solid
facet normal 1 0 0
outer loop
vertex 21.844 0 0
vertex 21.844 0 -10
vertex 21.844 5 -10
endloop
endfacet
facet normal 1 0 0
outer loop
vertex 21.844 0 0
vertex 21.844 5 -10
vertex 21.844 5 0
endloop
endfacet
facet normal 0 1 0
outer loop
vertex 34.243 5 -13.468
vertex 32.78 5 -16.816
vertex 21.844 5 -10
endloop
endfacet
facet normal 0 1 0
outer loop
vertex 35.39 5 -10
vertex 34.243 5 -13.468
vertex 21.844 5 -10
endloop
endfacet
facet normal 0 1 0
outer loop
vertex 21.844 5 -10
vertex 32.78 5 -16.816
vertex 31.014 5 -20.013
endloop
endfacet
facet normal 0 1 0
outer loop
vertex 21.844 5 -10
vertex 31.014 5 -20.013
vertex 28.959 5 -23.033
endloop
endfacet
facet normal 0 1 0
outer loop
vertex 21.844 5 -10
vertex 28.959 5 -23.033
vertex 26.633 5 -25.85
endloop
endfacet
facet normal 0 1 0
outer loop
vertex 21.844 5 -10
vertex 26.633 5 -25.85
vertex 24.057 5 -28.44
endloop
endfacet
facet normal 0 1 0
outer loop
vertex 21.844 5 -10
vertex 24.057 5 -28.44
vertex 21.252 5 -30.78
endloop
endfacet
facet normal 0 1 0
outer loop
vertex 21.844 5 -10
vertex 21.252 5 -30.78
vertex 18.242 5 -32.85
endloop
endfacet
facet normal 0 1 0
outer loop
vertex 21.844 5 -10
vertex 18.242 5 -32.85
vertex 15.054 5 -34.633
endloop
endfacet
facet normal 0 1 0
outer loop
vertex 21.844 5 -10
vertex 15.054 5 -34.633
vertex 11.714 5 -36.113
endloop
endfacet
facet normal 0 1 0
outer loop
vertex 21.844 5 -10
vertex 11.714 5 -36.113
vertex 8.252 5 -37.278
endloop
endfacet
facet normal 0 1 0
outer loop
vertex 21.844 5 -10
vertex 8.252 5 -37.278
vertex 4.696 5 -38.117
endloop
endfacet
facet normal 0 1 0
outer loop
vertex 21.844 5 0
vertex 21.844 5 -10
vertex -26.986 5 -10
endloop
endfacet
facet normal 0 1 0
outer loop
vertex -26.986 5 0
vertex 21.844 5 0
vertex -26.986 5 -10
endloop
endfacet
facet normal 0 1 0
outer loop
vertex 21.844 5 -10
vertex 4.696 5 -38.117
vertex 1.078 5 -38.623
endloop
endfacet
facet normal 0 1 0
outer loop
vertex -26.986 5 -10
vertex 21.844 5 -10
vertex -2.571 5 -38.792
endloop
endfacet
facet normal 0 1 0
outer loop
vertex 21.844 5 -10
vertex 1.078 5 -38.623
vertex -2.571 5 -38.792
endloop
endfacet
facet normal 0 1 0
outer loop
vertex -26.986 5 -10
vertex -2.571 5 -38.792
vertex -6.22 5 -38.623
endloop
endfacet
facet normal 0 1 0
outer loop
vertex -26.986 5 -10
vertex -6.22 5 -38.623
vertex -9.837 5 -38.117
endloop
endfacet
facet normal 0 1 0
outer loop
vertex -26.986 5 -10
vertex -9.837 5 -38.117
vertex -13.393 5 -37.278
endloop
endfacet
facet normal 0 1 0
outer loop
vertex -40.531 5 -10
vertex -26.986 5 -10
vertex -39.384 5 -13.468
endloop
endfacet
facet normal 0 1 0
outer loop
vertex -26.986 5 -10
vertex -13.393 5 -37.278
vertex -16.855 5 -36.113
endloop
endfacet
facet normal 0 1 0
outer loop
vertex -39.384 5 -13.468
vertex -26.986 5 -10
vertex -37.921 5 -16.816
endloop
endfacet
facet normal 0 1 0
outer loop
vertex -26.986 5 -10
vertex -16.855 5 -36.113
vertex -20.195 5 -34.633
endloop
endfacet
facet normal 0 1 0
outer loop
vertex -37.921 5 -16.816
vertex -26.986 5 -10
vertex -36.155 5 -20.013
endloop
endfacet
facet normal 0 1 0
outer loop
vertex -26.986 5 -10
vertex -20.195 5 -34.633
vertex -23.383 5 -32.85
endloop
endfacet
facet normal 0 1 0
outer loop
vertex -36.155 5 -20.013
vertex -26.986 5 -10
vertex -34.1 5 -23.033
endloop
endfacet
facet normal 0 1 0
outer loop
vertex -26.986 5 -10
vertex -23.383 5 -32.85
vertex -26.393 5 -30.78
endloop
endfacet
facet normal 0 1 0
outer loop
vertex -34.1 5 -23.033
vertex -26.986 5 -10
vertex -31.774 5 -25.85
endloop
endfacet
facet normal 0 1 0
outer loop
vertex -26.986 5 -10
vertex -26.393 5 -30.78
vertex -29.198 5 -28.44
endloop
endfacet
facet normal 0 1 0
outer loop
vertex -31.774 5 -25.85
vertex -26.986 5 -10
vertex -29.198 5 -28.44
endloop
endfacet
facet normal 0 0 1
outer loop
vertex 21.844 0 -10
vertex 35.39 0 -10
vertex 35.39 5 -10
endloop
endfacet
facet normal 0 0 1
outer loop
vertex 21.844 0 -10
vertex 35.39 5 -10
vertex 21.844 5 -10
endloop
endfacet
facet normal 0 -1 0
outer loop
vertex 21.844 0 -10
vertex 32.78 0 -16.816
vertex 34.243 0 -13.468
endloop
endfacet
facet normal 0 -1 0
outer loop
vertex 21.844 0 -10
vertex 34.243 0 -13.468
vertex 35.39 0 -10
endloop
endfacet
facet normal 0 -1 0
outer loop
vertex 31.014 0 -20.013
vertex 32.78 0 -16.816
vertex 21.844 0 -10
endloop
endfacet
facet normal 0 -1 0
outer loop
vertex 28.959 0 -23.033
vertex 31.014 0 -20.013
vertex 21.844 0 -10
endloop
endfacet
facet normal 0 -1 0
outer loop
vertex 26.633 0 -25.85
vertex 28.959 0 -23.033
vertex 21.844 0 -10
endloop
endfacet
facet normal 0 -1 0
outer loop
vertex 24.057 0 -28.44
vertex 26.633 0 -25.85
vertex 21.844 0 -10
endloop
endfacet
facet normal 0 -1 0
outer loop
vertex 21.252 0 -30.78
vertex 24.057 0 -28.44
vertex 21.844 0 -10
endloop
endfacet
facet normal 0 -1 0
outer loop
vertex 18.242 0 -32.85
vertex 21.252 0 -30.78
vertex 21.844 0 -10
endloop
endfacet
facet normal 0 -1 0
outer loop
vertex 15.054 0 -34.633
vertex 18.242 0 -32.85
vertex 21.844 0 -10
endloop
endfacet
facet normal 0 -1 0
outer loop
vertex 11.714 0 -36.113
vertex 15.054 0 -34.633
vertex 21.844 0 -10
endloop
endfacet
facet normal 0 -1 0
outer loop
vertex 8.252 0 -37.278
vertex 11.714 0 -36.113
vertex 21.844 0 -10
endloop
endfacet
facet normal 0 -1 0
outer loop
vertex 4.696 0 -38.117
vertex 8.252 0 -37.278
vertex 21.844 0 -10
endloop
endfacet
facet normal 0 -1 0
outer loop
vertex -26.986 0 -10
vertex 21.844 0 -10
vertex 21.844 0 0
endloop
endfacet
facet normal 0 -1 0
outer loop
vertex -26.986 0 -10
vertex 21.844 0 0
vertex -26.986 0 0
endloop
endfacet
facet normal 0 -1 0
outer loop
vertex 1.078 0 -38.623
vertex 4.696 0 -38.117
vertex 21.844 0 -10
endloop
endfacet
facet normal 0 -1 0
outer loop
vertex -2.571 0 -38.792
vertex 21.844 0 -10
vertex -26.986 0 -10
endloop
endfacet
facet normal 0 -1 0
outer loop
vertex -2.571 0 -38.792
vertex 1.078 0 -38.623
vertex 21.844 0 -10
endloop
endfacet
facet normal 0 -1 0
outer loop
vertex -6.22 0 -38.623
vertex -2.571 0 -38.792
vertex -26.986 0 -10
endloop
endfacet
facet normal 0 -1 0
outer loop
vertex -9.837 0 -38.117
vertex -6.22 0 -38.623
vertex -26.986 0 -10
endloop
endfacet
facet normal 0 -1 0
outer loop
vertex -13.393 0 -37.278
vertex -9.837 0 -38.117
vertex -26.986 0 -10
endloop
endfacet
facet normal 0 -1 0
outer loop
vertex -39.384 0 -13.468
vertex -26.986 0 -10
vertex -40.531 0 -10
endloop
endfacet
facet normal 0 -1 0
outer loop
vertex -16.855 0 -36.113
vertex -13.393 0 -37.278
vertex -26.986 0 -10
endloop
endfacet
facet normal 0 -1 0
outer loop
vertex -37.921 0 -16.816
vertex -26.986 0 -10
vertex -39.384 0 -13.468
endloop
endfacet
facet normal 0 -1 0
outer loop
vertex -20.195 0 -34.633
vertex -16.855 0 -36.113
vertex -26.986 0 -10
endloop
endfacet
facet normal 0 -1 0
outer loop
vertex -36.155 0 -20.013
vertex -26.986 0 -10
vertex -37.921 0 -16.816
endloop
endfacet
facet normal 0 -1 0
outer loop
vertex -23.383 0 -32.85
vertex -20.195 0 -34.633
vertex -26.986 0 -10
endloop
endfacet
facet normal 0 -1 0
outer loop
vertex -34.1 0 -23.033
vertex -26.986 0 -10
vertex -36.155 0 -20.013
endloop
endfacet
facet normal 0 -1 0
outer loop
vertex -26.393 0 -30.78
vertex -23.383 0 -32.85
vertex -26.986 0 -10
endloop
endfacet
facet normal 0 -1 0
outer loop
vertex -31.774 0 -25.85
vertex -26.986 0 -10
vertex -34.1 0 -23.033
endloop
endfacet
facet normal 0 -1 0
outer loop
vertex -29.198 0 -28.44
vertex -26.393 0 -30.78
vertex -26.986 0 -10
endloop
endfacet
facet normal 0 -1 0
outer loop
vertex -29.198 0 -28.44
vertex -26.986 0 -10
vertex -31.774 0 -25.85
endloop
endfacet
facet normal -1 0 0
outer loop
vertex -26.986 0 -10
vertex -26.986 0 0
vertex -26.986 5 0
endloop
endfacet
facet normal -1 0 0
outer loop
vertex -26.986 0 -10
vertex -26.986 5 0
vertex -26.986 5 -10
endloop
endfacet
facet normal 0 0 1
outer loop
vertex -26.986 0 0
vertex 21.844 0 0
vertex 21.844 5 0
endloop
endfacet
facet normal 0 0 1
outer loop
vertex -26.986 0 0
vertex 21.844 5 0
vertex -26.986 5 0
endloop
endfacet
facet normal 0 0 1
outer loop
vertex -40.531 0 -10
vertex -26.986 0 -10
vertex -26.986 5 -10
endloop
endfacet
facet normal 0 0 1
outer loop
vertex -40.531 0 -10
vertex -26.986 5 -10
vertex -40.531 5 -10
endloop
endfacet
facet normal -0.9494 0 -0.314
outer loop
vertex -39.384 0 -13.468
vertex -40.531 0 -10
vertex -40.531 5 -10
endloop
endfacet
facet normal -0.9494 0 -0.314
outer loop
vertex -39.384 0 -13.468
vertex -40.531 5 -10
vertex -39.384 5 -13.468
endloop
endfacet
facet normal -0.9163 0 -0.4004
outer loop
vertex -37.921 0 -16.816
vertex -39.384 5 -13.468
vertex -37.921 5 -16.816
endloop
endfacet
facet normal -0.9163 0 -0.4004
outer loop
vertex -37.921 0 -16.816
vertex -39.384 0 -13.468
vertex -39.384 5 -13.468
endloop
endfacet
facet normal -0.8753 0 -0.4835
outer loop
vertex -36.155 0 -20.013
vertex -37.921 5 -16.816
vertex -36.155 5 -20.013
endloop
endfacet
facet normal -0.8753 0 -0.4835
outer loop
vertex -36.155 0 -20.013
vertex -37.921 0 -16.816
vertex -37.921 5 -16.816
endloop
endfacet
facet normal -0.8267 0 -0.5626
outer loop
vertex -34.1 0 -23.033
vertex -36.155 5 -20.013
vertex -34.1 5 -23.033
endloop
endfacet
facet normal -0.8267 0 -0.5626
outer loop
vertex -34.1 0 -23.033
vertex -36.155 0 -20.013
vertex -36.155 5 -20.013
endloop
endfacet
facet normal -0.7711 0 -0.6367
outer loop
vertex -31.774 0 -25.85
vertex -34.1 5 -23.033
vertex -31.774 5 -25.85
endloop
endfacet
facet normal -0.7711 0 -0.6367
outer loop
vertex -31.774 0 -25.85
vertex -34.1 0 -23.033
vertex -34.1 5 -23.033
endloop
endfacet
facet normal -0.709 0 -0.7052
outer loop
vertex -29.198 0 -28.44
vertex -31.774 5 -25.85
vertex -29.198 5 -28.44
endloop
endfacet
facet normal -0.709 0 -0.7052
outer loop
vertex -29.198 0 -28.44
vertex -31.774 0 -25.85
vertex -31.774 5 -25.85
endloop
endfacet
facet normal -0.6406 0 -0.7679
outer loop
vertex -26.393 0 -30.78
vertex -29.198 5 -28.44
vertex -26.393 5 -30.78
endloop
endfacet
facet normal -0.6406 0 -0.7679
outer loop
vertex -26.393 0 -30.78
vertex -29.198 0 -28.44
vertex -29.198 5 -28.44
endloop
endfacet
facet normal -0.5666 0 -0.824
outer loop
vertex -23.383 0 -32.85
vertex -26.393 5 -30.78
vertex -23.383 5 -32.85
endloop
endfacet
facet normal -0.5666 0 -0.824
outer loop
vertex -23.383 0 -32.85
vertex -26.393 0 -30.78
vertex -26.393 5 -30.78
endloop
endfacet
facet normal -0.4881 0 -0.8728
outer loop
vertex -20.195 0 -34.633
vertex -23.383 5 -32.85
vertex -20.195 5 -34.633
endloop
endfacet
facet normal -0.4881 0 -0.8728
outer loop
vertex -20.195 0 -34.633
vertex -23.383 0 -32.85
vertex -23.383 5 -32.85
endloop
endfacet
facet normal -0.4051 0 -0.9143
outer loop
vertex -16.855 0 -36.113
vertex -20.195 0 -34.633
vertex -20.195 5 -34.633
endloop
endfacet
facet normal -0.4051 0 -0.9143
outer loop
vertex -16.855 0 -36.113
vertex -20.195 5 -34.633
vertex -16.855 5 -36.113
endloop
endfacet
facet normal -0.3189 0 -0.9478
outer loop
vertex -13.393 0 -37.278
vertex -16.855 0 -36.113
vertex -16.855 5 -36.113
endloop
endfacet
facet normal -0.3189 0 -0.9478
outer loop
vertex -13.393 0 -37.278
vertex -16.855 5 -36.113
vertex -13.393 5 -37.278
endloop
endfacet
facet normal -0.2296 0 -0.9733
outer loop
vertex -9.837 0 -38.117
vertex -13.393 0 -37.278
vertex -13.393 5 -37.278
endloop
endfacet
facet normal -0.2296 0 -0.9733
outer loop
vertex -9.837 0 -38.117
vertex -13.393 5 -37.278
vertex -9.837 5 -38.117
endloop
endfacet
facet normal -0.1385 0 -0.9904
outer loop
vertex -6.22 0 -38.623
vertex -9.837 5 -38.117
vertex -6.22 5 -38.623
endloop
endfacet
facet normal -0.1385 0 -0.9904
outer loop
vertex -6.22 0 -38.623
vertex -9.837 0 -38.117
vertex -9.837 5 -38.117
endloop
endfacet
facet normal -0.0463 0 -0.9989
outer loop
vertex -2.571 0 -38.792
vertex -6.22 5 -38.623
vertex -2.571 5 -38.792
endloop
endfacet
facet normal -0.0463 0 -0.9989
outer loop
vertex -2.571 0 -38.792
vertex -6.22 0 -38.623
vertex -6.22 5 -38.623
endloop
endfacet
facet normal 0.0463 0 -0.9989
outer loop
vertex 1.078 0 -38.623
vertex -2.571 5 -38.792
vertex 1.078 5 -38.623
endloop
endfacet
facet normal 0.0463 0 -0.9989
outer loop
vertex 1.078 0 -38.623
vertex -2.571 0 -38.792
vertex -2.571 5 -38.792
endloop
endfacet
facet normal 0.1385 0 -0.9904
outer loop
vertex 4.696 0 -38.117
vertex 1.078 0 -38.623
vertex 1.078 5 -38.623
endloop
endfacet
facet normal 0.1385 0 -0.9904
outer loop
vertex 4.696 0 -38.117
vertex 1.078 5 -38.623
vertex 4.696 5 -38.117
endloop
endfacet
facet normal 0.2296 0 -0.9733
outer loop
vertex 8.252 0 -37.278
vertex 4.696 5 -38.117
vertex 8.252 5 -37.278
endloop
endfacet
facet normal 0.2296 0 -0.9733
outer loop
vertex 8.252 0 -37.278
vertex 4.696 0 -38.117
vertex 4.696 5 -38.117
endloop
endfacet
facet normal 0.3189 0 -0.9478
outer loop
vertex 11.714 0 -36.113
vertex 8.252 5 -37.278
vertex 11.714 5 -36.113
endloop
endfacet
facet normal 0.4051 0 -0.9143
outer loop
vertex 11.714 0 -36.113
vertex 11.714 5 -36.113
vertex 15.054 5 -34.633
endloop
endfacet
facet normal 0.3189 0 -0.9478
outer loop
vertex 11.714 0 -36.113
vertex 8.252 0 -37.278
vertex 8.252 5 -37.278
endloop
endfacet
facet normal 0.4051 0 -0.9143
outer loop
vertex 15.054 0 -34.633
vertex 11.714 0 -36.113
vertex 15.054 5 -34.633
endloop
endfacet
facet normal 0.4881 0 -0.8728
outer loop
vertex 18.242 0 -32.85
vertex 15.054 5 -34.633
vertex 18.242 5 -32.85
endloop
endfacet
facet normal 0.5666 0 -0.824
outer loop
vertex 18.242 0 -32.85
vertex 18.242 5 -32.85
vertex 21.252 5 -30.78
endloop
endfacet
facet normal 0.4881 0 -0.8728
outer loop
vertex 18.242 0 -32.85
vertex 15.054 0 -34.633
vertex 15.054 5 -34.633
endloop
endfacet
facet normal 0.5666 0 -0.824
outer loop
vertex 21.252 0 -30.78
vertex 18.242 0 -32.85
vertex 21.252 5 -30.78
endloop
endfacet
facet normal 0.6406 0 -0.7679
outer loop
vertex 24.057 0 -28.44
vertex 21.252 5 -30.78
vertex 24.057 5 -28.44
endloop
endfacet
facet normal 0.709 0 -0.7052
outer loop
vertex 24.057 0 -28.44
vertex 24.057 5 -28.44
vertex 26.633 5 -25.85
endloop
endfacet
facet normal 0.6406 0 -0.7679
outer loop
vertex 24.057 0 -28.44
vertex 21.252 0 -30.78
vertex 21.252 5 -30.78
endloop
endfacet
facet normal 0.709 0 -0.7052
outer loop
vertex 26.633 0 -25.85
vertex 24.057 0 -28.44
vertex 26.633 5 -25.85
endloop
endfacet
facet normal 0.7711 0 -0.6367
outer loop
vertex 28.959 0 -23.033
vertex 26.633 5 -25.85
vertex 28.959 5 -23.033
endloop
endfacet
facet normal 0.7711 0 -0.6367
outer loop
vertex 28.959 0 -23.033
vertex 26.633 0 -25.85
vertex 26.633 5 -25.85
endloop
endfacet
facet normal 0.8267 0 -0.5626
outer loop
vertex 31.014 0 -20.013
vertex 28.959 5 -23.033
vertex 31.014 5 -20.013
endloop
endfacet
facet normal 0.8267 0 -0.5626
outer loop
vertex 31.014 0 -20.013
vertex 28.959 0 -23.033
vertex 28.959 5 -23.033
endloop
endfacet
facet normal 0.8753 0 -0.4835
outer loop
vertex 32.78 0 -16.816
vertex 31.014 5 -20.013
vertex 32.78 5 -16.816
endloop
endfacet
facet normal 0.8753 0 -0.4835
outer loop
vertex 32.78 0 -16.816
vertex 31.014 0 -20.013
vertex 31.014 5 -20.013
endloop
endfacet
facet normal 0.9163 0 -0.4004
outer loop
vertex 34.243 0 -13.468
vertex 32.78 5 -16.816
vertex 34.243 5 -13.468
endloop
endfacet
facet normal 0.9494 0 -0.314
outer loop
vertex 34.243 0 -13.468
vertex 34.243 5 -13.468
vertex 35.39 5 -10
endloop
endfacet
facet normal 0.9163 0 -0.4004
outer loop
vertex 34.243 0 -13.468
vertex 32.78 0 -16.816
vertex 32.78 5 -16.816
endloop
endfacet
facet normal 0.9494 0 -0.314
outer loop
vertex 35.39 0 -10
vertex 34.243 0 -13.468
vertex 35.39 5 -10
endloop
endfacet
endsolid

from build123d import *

# Parameters (mm, degrees)
BOSS_EXTRUDE1_DEPTH = 5


with BuildPart() as part:
    # Sketch1 → Boss-Extrude1 (new body)
    with BuildSketch(Plane(origin=(0, 0, 0), x_dir=(1, 0, 0), z_dir=(0, 1, 0))):
        with BuildLine():
            ThreePointArc((-40.530858986, 10), (-2.570543478, 38.792166423), (35.38977203, 10))
            Line((35.38977203, 10), (21.844456522, 10))
            Line((21.844456522, 10), (21.844456522, 0))
            Line((21.844456522, 0), (-26.985543478, 0))
            Line((-26.985543478, 0), (-26.985543478, 10))
            Line((-26.985543478, 10), (-40.530858986, 10))
        make_face()
    extrude(amount=BOSS_EXTRUDE1_DEPTH)


solid = part.part
